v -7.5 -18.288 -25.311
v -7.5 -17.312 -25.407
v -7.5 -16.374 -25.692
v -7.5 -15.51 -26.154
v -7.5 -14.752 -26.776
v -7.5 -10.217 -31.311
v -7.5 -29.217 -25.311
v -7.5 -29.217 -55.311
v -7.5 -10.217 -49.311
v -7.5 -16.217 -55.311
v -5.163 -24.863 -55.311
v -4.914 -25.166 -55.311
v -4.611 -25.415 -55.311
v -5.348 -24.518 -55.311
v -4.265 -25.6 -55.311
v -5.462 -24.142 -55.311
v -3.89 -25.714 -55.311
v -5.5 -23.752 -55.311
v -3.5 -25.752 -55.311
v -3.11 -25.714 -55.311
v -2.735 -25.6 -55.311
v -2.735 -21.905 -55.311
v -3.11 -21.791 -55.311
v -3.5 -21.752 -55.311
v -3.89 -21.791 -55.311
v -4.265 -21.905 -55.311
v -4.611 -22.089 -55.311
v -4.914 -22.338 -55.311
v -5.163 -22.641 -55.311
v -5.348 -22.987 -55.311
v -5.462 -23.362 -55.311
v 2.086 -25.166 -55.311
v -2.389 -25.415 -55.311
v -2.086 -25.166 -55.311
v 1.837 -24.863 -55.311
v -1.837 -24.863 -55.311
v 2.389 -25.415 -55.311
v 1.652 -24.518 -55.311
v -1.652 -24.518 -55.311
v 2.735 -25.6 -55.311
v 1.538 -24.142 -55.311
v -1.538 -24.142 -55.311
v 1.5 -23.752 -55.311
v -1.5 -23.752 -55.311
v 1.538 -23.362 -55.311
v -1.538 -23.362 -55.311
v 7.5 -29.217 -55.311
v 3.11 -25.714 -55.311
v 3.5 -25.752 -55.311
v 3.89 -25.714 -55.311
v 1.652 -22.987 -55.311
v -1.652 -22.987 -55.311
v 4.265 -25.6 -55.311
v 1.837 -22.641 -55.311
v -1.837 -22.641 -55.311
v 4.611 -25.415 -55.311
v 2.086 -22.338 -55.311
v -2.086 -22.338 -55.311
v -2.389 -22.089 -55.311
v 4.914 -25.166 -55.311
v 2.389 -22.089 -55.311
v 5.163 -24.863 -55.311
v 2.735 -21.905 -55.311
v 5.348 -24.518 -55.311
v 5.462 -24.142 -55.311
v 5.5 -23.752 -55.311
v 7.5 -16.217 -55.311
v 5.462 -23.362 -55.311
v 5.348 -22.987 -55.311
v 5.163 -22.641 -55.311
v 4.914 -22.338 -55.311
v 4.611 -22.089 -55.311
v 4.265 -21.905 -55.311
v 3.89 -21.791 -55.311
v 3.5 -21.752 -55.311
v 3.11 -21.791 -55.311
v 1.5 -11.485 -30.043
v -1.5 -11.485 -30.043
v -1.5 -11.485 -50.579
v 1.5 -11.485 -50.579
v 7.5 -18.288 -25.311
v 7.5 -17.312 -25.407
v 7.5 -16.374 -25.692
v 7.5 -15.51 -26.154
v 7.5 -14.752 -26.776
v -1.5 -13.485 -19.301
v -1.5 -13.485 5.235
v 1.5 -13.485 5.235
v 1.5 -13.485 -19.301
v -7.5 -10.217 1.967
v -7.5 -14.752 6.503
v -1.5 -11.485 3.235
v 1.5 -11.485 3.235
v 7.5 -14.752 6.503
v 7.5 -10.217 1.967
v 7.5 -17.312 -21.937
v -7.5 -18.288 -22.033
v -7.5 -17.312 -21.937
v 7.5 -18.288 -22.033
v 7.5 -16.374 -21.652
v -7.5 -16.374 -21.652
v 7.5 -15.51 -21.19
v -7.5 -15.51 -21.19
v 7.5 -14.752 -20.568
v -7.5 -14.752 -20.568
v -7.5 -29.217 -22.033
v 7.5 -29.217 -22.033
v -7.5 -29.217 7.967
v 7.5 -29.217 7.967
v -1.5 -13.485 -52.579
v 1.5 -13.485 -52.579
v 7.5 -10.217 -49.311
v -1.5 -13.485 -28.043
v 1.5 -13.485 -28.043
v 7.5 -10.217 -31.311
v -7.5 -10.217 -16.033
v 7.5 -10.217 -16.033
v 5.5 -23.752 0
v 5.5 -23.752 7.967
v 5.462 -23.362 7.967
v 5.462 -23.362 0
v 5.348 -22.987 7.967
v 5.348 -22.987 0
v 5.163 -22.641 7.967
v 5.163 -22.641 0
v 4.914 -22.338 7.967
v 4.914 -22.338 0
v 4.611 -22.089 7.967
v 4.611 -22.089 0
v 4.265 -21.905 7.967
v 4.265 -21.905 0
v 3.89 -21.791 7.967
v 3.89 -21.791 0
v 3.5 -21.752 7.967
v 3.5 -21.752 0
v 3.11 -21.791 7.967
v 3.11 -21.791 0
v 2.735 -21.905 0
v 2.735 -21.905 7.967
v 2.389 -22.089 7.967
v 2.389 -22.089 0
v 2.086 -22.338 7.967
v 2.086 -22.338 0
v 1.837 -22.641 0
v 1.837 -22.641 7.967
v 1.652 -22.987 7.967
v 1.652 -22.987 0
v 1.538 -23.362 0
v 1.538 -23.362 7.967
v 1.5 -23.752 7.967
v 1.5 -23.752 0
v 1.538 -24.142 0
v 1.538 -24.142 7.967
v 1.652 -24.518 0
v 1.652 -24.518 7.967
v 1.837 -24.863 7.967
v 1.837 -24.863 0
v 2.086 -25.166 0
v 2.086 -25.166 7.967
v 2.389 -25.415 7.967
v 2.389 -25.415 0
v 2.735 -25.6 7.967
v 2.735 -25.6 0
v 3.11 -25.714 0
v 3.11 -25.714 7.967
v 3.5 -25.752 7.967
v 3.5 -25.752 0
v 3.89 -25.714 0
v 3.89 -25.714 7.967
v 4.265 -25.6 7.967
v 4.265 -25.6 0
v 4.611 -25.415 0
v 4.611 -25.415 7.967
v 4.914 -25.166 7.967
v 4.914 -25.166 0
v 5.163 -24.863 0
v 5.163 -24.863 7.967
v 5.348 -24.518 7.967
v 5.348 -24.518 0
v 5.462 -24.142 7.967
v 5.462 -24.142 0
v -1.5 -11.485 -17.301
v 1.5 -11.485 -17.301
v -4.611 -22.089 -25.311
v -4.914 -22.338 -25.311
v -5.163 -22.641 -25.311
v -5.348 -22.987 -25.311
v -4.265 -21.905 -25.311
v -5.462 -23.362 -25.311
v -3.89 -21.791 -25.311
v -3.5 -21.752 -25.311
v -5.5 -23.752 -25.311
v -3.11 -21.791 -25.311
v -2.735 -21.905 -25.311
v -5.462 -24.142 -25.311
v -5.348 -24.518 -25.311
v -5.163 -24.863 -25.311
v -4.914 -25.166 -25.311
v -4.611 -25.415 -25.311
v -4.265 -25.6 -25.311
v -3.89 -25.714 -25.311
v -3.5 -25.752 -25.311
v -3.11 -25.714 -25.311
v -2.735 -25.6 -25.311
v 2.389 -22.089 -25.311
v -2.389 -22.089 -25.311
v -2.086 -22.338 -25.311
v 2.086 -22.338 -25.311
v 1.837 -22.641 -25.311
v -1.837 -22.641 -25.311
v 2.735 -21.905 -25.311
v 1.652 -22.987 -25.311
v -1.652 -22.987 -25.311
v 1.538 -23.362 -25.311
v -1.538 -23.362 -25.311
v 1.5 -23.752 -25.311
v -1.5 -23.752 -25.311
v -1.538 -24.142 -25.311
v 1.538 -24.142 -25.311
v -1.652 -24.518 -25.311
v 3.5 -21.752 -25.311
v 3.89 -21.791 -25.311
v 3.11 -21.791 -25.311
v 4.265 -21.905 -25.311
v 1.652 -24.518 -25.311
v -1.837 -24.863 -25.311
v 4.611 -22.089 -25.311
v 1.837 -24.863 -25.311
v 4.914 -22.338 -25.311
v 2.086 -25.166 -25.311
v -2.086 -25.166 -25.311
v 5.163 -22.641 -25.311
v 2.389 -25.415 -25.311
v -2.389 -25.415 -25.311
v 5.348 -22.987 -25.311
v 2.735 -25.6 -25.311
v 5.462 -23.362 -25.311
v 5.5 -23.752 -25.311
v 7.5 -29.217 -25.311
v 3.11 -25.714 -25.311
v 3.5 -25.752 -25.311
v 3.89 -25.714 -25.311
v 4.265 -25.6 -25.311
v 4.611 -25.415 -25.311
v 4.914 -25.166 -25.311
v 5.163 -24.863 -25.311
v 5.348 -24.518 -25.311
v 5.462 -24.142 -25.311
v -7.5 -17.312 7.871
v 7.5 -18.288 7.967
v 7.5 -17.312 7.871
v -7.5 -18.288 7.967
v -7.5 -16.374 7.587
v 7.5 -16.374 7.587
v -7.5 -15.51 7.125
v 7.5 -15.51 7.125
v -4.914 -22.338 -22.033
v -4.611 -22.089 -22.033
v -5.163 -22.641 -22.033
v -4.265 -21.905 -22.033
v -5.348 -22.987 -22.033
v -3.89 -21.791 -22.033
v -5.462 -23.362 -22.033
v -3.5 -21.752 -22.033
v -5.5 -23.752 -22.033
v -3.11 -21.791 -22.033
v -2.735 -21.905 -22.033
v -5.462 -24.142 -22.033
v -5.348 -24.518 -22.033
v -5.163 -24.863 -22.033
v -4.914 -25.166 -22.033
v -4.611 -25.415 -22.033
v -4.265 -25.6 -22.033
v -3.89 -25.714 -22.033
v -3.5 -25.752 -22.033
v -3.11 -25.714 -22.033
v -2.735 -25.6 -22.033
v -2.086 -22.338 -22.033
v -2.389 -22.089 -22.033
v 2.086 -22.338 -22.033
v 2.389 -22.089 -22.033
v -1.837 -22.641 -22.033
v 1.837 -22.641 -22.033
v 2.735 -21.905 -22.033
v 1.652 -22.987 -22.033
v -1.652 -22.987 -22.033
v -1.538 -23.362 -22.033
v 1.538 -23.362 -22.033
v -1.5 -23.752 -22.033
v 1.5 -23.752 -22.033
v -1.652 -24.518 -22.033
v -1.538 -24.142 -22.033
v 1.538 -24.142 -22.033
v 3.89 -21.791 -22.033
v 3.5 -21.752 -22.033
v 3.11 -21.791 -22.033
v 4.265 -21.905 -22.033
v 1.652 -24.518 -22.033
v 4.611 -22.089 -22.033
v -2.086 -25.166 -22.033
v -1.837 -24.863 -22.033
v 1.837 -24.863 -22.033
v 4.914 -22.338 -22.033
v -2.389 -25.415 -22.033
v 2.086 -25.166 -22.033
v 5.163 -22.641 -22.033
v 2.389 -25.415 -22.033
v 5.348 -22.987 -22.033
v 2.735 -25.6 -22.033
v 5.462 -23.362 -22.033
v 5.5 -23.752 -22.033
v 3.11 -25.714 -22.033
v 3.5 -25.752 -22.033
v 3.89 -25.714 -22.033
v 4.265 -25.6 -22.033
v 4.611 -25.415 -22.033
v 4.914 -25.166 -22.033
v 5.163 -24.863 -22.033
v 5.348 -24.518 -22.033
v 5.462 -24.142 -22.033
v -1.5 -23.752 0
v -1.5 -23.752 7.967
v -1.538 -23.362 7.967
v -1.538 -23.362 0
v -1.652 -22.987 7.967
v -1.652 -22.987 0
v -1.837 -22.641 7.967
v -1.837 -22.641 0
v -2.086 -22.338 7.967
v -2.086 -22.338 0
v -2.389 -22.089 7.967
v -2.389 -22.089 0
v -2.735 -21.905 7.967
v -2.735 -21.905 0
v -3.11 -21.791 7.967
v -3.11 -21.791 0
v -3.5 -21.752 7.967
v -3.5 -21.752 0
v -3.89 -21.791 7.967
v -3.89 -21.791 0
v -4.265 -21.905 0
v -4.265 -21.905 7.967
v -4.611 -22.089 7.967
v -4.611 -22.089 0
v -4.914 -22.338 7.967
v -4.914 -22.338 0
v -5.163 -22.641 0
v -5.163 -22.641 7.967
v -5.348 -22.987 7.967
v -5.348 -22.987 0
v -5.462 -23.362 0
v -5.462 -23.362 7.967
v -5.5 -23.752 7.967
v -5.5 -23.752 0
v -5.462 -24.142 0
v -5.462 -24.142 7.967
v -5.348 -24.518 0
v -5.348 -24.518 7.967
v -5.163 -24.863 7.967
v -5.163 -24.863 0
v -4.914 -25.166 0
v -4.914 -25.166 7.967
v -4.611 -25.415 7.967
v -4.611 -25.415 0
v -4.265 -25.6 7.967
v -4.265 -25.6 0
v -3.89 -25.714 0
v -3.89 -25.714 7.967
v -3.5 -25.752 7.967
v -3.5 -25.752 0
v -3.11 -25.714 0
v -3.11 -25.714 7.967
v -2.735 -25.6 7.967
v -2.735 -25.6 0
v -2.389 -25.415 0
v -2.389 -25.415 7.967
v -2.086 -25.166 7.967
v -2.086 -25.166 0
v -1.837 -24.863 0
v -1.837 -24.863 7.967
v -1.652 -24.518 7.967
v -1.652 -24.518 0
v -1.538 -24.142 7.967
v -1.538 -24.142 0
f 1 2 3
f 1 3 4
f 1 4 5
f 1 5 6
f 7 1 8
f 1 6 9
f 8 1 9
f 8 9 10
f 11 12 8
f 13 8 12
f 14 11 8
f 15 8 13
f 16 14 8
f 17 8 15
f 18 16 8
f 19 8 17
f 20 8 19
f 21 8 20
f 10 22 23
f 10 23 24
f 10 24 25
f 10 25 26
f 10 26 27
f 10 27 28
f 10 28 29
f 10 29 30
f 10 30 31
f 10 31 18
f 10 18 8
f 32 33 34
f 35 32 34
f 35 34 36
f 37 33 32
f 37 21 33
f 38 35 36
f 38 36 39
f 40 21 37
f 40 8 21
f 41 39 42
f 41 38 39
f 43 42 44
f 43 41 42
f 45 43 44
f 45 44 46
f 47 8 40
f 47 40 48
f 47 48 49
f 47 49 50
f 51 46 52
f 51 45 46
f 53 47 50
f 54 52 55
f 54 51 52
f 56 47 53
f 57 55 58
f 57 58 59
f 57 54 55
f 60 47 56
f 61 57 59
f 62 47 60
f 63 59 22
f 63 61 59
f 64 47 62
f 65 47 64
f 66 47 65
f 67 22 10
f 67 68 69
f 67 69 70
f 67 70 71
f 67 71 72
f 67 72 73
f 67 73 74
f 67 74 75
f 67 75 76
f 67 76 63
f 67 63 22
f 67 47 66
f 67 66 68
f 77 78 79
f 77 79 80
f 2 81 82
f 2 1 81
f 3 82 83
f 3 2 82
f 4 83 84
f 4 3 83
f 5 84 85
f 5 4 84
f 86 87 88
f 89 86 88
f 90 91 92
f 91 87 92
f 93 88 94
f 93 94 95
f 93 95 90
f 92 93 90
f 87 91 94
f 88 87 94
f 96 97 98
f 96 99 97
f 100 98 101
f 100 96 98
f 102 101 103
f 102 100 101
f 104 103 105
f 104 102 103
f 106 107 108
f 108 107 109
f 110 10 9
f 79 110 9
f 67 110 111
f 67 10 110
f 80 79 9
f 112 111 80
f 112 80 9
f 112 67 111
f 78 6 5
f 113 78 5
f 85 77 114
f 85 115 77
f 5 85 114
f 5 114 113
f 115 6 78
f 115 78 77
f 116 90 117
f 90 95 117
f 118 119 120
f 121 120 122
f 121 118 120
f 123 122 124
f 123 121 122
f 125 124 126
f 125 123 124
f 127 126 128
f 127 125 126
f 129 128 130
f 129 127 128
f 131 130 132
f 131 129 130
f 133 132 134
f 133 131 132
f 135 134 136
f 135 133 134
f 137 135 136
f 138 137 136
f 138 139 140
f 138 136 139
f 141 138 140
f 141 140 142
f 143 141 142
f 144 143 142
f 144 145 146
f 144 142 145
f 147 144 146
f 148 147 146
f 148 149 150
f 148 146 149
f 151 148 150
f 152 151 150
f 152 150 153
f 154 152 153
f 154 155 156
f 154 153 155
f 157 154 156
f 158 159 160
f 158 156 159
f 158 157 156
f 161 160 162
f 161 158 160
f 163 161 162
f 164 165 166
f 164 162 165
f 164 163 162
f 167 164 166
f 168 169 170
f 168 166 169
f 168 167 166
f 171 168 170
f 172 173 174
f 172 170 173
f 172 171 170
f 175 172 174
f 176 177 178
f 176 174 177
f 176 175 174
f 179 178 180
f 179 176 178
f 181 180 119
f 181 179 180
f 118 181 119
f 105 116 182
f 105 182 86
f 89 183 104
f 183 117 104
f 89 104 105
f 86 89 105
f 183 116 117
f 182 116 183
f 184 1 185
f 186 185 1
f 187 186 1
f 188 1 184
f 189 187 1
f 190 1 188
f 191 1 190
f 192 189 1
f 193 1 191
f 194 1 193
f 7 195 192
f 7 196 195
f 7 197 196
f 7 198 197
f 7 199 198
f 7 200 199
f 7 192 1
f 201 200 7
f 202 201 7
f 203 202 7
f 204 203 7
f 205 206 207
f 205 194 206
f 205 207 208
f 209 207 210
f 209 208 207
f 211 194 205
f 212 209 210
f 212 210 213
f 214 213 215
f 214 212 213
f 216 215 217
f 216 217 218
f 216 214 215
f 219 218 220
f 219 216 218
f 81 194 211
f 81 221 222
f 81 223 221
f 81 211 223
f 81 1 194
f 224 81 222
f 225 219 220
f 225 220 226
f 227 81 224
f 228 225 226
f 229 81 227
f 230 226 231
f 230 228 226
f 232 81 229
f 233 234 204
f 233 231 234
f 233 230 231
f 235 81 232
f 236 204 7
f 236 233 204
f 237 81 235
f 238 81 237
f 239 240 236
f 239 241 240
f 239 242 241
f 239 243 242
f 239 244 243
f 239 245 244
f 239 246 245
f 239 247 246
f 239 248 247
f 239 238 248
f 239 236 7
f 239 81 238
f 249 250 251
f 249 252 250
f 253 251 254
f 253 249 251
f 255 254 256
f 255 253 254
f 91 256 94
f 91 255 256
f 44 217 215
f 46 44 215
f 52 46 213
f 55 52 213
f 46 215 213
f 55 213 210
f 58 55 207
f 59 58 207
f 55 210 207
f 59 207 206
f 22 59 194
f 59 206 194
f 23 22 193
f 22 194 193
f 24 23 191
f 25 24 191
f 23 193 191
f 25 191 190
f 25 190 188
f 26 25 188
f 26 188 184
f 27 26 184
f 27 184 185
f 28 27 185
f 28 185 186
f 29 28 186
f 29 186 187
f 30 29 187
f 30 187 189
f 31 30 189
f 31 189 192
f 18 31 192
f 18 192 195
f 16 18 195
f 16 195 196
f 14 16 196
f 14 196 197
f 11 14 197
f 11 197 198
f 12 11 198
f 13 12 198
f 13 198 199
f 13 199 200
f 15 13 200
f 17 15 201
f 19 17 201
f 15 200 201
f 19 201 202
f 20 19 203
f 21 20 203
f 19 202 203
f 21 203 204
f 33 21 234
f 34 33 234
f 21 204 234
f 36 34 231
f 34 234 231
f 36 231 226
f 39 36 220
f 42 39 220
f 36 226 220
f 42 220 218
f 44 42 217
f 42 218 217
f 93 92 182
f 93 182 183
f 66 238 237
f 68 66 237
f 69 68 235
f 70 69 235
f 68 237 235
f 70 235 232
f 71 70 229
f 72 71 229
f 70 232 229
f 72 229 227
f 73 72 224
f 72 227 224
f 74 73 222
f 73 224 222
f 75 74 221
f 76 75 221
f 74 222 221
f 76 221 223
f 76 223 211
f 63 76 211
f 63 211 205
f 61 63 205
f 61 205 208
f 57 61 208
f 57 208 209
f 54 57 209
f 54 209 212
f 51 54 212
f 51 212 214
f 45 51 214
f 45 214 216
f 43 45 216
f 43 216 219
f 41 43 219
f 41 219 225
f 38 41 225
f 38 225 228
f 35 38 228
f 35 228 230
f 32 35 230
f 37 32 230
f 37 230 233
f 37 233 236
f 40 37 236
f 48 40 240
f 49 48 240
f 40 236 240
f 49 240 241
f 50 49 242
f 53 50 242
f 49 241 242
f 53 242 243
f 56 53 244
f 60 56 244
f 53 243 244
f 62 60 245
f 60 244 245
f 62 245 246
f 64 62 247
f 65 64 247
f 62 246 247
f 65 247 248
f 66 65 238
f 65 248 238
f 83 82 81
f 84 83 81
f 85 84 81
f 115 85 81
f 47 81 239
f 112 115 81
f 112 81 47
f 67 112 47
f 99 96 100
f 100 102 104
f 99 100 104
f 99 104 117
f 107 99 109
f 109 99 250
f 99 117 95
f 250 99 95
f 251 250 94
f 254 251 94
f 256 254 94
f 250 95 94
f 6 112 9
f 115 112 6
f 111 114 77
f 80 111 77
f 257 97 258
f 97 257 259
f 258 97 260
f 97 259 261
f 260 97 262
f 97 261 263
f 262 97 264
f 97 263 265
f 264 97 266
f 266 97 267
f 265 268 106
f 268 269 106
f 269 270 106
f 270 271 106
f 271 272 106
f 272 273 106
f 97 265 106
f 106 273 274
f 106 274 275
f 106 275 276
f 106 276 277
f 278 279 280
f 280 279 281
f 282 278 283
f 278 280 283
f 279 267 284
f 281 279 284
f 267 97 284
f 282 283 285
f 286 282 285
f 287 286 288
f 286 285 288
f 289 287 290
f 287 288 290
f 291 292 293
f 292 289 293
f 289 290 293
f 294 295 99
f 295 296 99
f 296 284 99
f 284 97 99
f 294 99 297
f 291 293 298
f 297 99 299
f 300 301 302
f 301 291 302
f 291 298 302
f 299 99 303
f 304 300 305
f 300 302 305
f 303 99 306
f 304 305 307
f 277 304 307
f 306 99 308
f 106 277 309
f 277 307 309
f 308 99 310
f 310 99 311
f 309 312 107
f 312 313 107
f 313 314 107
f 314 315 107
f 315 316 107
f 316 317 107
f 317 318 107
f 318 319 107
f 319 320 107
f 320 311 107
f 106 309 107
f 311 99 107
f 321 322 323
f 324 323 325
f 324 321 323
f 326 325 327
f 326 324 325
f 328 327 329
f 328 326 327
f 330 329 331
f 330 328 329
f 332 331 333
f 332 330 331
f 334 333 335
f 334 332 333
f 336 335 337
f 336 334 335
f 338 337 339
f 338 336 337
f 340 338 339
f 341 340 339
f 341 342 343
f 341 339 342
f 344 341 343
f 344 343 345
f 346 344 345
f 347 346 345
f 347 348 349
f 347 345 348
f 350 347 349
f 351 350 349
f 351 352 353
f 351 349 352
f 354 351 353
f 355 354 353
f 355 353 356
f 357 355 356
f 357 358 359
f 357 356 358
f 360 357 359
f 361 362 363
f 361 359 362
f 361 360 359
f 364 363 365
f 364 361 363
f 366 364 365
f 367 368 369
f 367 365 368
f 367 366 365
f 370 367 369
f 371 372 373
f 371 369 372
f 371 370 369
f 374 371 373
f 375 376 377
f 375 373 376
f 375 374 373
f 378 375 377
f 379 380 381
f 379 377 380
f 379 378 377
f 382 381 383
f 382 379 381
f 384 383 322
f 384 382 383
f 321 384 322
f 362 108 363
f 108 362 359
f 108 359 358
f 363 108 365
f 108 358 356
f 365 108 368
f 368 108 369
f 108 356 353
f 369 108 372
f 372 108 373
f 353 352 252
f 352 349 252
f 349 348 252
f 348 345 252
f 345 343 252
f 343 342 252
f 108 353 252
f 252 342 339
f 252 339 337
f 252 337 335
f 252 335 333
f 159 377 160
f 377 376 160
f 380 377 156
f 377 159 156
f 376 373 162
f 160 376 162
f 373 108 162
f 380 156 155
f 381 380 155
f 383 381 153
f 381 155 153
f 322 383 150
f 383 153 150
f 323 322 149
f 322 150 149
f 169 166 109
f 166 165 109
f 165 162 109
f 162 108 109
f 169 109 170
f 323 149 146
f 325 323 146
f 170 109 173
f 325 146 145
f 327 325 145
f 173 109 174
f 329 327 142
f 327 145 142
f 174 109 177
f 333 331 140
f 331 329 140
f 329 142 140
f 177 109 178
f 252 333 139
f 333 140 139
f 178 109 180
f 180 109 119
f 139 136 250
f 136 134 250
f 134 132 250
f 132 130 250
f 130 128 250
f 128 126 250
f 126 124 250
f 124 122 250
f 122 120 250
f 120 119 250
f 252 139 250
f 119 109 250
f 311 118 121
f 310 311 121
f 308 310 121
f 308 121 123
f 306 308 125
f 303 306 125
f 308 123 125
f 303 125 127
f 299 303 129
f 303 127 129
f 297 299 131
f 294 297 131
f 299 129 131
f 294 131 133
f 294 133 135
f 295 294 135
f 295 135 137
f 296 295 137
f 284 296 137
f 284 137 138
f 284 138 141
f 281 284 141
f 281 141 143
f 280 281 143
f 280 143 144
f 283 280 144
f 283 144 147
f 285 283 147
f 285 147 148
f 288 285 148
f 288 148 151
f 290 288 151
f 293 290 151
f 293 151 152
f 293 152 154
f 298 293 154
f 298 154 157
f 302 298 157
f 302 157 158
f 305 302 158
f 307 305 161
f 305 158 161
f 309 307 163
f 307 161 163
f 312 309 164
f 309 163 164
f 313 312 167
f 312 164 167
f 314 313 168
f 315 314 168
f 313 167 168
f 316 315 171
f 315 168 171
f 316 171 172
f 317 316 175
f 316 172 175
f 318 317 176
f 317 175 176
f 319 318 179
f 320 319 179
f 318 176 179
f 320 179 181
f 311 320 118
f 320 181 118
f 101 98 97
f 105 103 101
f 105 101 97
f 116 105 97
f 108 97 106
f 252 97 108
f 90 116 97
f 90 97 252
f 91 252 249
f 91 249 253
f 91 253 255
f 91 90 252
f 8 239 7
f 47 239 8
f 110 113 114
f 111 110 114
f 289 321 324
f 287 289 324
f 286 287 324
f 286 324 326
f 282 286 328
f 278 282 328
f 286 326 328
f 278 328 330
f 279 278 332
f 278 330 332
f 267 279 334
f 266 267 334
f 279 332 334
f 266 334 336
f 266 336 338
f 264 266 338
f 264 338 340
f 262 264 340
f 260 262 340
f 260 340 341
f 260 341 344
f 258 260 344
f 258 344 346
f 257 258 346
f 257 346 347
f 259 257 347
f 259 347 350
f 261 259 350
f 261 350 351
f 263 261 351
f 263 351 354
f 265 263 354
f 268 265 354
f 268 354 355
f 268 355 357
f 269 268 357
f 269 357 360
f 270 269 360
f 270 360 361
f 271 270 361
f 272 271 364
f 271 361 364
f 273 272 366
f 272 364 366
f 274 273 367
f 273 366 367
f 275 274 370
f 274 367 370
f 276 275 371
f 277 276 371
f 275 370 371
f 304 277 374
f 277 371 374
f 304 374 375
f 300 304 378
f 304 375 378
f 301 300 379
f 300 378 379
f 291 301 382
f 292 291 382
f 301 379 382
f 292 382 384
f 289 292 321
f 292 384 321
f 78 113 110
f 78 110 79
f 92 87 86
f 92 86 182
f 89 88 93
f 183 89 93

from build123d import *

# Parameters (mm, degrees)
BOSS_EXTRUDE2_DEPTH = 7.5
BOSS_EXTRUDE3_DEPTH = 7.5
FILLET1_R           = 5
FILLET2_R           = 5
SKETCH4_R           = 2
SKETCH4_W           = 3
SKETCH4_H           = 2
CUT_EXTRUDE1_DEPTH  = 100


with BuildPart() as part:
    # Sketch2 → Boss-Extrude2 (new, symmetric)
    with BuildSketch(Plane(origin=(0, 0, 0), x_dir=(0, 0, -1), z_dir=(1, 0, 0))):
        Polygon((-7.967160281, -29.21673477), (-7.967160281, -16.21673477), (-1.967160281, -10.21673477), (16.032839719, -10.21673477), (22.032839719, -16.21673477), (22.032839719, -29.21673477), align=None)
    extrude(amount=BOSS_EXTRUDE2_DEPTH, both=True)

    # Fillet2
    fillet2_edges = [part.edges().sort_by_distance(p)[0] for p in [
        (0, -16.21673477, 7.967160281),
        (0, -16.21673477, -22.032839719),
    ]]
    fillet(fillet2_edges, radius=FILLET2_R)


with BuildPart() as body_2:
    # Sketch3 → Boss-Extrude3 (new, symmetric)
    with BuildSketch(Plane(origin=(0, 0, 0), x_dir=(0, 0, -1), z_dir=(1, 0, 0))):
        Polygon((25.31118522, -16.21673477), (25.31118522, -29.21673477), (55.31118522, -29.21673477), (55.31118522, -16.21673477), (49.31118522, -10.21673477), (31.31118522, -10.21673477), align=None)
    extrude(amount=BOSS_EXTRUDE3_DEPTH, both=True)

    # Fillet1
    fillet1_edges = [body_2.edges().sort_by_distance(p)[0] for p in [
        (0, -16.21673477, -25.31118522),
    ]]
    fillet(fillet1_edges, radius=FILLET1_R)


with BuildPart() as cut_extrude1_tool:
    # Sketch4 → Cut-Extrude1 (new, symmetric)
    with BuildSketch(Plane.XY):
        with Locations((-3.5, -23.752268676)):
            Circle(SKETCH4_R)
        with Locations((3.5, -23.752268676)):
            Circle(SKETCH4_R)
        with Locations((0, -12.484501723)):
            Rectangle(SKETCH4_W, SKETCH4_H)
    extrude(amount=CUT_EXTRUDE1_DEPTH, both=True)


with BuildPart() as part_1:
    add(part.part)

    # Cut-Extrude1: cut by cut_extrude1_tool
    add(cut_extrude1_tool.part, mode=Mode.SUBTRACT)


with BuildPart() as body_2_1:
    add(body_2.part)

    # Cut-Extrude1: cut by cut_extrude1_tool
    add(cut_extrude1_tool.part, mode=Mode.SUBTRACT)


solid = Compound([part_1.part, body_2_1.part])
